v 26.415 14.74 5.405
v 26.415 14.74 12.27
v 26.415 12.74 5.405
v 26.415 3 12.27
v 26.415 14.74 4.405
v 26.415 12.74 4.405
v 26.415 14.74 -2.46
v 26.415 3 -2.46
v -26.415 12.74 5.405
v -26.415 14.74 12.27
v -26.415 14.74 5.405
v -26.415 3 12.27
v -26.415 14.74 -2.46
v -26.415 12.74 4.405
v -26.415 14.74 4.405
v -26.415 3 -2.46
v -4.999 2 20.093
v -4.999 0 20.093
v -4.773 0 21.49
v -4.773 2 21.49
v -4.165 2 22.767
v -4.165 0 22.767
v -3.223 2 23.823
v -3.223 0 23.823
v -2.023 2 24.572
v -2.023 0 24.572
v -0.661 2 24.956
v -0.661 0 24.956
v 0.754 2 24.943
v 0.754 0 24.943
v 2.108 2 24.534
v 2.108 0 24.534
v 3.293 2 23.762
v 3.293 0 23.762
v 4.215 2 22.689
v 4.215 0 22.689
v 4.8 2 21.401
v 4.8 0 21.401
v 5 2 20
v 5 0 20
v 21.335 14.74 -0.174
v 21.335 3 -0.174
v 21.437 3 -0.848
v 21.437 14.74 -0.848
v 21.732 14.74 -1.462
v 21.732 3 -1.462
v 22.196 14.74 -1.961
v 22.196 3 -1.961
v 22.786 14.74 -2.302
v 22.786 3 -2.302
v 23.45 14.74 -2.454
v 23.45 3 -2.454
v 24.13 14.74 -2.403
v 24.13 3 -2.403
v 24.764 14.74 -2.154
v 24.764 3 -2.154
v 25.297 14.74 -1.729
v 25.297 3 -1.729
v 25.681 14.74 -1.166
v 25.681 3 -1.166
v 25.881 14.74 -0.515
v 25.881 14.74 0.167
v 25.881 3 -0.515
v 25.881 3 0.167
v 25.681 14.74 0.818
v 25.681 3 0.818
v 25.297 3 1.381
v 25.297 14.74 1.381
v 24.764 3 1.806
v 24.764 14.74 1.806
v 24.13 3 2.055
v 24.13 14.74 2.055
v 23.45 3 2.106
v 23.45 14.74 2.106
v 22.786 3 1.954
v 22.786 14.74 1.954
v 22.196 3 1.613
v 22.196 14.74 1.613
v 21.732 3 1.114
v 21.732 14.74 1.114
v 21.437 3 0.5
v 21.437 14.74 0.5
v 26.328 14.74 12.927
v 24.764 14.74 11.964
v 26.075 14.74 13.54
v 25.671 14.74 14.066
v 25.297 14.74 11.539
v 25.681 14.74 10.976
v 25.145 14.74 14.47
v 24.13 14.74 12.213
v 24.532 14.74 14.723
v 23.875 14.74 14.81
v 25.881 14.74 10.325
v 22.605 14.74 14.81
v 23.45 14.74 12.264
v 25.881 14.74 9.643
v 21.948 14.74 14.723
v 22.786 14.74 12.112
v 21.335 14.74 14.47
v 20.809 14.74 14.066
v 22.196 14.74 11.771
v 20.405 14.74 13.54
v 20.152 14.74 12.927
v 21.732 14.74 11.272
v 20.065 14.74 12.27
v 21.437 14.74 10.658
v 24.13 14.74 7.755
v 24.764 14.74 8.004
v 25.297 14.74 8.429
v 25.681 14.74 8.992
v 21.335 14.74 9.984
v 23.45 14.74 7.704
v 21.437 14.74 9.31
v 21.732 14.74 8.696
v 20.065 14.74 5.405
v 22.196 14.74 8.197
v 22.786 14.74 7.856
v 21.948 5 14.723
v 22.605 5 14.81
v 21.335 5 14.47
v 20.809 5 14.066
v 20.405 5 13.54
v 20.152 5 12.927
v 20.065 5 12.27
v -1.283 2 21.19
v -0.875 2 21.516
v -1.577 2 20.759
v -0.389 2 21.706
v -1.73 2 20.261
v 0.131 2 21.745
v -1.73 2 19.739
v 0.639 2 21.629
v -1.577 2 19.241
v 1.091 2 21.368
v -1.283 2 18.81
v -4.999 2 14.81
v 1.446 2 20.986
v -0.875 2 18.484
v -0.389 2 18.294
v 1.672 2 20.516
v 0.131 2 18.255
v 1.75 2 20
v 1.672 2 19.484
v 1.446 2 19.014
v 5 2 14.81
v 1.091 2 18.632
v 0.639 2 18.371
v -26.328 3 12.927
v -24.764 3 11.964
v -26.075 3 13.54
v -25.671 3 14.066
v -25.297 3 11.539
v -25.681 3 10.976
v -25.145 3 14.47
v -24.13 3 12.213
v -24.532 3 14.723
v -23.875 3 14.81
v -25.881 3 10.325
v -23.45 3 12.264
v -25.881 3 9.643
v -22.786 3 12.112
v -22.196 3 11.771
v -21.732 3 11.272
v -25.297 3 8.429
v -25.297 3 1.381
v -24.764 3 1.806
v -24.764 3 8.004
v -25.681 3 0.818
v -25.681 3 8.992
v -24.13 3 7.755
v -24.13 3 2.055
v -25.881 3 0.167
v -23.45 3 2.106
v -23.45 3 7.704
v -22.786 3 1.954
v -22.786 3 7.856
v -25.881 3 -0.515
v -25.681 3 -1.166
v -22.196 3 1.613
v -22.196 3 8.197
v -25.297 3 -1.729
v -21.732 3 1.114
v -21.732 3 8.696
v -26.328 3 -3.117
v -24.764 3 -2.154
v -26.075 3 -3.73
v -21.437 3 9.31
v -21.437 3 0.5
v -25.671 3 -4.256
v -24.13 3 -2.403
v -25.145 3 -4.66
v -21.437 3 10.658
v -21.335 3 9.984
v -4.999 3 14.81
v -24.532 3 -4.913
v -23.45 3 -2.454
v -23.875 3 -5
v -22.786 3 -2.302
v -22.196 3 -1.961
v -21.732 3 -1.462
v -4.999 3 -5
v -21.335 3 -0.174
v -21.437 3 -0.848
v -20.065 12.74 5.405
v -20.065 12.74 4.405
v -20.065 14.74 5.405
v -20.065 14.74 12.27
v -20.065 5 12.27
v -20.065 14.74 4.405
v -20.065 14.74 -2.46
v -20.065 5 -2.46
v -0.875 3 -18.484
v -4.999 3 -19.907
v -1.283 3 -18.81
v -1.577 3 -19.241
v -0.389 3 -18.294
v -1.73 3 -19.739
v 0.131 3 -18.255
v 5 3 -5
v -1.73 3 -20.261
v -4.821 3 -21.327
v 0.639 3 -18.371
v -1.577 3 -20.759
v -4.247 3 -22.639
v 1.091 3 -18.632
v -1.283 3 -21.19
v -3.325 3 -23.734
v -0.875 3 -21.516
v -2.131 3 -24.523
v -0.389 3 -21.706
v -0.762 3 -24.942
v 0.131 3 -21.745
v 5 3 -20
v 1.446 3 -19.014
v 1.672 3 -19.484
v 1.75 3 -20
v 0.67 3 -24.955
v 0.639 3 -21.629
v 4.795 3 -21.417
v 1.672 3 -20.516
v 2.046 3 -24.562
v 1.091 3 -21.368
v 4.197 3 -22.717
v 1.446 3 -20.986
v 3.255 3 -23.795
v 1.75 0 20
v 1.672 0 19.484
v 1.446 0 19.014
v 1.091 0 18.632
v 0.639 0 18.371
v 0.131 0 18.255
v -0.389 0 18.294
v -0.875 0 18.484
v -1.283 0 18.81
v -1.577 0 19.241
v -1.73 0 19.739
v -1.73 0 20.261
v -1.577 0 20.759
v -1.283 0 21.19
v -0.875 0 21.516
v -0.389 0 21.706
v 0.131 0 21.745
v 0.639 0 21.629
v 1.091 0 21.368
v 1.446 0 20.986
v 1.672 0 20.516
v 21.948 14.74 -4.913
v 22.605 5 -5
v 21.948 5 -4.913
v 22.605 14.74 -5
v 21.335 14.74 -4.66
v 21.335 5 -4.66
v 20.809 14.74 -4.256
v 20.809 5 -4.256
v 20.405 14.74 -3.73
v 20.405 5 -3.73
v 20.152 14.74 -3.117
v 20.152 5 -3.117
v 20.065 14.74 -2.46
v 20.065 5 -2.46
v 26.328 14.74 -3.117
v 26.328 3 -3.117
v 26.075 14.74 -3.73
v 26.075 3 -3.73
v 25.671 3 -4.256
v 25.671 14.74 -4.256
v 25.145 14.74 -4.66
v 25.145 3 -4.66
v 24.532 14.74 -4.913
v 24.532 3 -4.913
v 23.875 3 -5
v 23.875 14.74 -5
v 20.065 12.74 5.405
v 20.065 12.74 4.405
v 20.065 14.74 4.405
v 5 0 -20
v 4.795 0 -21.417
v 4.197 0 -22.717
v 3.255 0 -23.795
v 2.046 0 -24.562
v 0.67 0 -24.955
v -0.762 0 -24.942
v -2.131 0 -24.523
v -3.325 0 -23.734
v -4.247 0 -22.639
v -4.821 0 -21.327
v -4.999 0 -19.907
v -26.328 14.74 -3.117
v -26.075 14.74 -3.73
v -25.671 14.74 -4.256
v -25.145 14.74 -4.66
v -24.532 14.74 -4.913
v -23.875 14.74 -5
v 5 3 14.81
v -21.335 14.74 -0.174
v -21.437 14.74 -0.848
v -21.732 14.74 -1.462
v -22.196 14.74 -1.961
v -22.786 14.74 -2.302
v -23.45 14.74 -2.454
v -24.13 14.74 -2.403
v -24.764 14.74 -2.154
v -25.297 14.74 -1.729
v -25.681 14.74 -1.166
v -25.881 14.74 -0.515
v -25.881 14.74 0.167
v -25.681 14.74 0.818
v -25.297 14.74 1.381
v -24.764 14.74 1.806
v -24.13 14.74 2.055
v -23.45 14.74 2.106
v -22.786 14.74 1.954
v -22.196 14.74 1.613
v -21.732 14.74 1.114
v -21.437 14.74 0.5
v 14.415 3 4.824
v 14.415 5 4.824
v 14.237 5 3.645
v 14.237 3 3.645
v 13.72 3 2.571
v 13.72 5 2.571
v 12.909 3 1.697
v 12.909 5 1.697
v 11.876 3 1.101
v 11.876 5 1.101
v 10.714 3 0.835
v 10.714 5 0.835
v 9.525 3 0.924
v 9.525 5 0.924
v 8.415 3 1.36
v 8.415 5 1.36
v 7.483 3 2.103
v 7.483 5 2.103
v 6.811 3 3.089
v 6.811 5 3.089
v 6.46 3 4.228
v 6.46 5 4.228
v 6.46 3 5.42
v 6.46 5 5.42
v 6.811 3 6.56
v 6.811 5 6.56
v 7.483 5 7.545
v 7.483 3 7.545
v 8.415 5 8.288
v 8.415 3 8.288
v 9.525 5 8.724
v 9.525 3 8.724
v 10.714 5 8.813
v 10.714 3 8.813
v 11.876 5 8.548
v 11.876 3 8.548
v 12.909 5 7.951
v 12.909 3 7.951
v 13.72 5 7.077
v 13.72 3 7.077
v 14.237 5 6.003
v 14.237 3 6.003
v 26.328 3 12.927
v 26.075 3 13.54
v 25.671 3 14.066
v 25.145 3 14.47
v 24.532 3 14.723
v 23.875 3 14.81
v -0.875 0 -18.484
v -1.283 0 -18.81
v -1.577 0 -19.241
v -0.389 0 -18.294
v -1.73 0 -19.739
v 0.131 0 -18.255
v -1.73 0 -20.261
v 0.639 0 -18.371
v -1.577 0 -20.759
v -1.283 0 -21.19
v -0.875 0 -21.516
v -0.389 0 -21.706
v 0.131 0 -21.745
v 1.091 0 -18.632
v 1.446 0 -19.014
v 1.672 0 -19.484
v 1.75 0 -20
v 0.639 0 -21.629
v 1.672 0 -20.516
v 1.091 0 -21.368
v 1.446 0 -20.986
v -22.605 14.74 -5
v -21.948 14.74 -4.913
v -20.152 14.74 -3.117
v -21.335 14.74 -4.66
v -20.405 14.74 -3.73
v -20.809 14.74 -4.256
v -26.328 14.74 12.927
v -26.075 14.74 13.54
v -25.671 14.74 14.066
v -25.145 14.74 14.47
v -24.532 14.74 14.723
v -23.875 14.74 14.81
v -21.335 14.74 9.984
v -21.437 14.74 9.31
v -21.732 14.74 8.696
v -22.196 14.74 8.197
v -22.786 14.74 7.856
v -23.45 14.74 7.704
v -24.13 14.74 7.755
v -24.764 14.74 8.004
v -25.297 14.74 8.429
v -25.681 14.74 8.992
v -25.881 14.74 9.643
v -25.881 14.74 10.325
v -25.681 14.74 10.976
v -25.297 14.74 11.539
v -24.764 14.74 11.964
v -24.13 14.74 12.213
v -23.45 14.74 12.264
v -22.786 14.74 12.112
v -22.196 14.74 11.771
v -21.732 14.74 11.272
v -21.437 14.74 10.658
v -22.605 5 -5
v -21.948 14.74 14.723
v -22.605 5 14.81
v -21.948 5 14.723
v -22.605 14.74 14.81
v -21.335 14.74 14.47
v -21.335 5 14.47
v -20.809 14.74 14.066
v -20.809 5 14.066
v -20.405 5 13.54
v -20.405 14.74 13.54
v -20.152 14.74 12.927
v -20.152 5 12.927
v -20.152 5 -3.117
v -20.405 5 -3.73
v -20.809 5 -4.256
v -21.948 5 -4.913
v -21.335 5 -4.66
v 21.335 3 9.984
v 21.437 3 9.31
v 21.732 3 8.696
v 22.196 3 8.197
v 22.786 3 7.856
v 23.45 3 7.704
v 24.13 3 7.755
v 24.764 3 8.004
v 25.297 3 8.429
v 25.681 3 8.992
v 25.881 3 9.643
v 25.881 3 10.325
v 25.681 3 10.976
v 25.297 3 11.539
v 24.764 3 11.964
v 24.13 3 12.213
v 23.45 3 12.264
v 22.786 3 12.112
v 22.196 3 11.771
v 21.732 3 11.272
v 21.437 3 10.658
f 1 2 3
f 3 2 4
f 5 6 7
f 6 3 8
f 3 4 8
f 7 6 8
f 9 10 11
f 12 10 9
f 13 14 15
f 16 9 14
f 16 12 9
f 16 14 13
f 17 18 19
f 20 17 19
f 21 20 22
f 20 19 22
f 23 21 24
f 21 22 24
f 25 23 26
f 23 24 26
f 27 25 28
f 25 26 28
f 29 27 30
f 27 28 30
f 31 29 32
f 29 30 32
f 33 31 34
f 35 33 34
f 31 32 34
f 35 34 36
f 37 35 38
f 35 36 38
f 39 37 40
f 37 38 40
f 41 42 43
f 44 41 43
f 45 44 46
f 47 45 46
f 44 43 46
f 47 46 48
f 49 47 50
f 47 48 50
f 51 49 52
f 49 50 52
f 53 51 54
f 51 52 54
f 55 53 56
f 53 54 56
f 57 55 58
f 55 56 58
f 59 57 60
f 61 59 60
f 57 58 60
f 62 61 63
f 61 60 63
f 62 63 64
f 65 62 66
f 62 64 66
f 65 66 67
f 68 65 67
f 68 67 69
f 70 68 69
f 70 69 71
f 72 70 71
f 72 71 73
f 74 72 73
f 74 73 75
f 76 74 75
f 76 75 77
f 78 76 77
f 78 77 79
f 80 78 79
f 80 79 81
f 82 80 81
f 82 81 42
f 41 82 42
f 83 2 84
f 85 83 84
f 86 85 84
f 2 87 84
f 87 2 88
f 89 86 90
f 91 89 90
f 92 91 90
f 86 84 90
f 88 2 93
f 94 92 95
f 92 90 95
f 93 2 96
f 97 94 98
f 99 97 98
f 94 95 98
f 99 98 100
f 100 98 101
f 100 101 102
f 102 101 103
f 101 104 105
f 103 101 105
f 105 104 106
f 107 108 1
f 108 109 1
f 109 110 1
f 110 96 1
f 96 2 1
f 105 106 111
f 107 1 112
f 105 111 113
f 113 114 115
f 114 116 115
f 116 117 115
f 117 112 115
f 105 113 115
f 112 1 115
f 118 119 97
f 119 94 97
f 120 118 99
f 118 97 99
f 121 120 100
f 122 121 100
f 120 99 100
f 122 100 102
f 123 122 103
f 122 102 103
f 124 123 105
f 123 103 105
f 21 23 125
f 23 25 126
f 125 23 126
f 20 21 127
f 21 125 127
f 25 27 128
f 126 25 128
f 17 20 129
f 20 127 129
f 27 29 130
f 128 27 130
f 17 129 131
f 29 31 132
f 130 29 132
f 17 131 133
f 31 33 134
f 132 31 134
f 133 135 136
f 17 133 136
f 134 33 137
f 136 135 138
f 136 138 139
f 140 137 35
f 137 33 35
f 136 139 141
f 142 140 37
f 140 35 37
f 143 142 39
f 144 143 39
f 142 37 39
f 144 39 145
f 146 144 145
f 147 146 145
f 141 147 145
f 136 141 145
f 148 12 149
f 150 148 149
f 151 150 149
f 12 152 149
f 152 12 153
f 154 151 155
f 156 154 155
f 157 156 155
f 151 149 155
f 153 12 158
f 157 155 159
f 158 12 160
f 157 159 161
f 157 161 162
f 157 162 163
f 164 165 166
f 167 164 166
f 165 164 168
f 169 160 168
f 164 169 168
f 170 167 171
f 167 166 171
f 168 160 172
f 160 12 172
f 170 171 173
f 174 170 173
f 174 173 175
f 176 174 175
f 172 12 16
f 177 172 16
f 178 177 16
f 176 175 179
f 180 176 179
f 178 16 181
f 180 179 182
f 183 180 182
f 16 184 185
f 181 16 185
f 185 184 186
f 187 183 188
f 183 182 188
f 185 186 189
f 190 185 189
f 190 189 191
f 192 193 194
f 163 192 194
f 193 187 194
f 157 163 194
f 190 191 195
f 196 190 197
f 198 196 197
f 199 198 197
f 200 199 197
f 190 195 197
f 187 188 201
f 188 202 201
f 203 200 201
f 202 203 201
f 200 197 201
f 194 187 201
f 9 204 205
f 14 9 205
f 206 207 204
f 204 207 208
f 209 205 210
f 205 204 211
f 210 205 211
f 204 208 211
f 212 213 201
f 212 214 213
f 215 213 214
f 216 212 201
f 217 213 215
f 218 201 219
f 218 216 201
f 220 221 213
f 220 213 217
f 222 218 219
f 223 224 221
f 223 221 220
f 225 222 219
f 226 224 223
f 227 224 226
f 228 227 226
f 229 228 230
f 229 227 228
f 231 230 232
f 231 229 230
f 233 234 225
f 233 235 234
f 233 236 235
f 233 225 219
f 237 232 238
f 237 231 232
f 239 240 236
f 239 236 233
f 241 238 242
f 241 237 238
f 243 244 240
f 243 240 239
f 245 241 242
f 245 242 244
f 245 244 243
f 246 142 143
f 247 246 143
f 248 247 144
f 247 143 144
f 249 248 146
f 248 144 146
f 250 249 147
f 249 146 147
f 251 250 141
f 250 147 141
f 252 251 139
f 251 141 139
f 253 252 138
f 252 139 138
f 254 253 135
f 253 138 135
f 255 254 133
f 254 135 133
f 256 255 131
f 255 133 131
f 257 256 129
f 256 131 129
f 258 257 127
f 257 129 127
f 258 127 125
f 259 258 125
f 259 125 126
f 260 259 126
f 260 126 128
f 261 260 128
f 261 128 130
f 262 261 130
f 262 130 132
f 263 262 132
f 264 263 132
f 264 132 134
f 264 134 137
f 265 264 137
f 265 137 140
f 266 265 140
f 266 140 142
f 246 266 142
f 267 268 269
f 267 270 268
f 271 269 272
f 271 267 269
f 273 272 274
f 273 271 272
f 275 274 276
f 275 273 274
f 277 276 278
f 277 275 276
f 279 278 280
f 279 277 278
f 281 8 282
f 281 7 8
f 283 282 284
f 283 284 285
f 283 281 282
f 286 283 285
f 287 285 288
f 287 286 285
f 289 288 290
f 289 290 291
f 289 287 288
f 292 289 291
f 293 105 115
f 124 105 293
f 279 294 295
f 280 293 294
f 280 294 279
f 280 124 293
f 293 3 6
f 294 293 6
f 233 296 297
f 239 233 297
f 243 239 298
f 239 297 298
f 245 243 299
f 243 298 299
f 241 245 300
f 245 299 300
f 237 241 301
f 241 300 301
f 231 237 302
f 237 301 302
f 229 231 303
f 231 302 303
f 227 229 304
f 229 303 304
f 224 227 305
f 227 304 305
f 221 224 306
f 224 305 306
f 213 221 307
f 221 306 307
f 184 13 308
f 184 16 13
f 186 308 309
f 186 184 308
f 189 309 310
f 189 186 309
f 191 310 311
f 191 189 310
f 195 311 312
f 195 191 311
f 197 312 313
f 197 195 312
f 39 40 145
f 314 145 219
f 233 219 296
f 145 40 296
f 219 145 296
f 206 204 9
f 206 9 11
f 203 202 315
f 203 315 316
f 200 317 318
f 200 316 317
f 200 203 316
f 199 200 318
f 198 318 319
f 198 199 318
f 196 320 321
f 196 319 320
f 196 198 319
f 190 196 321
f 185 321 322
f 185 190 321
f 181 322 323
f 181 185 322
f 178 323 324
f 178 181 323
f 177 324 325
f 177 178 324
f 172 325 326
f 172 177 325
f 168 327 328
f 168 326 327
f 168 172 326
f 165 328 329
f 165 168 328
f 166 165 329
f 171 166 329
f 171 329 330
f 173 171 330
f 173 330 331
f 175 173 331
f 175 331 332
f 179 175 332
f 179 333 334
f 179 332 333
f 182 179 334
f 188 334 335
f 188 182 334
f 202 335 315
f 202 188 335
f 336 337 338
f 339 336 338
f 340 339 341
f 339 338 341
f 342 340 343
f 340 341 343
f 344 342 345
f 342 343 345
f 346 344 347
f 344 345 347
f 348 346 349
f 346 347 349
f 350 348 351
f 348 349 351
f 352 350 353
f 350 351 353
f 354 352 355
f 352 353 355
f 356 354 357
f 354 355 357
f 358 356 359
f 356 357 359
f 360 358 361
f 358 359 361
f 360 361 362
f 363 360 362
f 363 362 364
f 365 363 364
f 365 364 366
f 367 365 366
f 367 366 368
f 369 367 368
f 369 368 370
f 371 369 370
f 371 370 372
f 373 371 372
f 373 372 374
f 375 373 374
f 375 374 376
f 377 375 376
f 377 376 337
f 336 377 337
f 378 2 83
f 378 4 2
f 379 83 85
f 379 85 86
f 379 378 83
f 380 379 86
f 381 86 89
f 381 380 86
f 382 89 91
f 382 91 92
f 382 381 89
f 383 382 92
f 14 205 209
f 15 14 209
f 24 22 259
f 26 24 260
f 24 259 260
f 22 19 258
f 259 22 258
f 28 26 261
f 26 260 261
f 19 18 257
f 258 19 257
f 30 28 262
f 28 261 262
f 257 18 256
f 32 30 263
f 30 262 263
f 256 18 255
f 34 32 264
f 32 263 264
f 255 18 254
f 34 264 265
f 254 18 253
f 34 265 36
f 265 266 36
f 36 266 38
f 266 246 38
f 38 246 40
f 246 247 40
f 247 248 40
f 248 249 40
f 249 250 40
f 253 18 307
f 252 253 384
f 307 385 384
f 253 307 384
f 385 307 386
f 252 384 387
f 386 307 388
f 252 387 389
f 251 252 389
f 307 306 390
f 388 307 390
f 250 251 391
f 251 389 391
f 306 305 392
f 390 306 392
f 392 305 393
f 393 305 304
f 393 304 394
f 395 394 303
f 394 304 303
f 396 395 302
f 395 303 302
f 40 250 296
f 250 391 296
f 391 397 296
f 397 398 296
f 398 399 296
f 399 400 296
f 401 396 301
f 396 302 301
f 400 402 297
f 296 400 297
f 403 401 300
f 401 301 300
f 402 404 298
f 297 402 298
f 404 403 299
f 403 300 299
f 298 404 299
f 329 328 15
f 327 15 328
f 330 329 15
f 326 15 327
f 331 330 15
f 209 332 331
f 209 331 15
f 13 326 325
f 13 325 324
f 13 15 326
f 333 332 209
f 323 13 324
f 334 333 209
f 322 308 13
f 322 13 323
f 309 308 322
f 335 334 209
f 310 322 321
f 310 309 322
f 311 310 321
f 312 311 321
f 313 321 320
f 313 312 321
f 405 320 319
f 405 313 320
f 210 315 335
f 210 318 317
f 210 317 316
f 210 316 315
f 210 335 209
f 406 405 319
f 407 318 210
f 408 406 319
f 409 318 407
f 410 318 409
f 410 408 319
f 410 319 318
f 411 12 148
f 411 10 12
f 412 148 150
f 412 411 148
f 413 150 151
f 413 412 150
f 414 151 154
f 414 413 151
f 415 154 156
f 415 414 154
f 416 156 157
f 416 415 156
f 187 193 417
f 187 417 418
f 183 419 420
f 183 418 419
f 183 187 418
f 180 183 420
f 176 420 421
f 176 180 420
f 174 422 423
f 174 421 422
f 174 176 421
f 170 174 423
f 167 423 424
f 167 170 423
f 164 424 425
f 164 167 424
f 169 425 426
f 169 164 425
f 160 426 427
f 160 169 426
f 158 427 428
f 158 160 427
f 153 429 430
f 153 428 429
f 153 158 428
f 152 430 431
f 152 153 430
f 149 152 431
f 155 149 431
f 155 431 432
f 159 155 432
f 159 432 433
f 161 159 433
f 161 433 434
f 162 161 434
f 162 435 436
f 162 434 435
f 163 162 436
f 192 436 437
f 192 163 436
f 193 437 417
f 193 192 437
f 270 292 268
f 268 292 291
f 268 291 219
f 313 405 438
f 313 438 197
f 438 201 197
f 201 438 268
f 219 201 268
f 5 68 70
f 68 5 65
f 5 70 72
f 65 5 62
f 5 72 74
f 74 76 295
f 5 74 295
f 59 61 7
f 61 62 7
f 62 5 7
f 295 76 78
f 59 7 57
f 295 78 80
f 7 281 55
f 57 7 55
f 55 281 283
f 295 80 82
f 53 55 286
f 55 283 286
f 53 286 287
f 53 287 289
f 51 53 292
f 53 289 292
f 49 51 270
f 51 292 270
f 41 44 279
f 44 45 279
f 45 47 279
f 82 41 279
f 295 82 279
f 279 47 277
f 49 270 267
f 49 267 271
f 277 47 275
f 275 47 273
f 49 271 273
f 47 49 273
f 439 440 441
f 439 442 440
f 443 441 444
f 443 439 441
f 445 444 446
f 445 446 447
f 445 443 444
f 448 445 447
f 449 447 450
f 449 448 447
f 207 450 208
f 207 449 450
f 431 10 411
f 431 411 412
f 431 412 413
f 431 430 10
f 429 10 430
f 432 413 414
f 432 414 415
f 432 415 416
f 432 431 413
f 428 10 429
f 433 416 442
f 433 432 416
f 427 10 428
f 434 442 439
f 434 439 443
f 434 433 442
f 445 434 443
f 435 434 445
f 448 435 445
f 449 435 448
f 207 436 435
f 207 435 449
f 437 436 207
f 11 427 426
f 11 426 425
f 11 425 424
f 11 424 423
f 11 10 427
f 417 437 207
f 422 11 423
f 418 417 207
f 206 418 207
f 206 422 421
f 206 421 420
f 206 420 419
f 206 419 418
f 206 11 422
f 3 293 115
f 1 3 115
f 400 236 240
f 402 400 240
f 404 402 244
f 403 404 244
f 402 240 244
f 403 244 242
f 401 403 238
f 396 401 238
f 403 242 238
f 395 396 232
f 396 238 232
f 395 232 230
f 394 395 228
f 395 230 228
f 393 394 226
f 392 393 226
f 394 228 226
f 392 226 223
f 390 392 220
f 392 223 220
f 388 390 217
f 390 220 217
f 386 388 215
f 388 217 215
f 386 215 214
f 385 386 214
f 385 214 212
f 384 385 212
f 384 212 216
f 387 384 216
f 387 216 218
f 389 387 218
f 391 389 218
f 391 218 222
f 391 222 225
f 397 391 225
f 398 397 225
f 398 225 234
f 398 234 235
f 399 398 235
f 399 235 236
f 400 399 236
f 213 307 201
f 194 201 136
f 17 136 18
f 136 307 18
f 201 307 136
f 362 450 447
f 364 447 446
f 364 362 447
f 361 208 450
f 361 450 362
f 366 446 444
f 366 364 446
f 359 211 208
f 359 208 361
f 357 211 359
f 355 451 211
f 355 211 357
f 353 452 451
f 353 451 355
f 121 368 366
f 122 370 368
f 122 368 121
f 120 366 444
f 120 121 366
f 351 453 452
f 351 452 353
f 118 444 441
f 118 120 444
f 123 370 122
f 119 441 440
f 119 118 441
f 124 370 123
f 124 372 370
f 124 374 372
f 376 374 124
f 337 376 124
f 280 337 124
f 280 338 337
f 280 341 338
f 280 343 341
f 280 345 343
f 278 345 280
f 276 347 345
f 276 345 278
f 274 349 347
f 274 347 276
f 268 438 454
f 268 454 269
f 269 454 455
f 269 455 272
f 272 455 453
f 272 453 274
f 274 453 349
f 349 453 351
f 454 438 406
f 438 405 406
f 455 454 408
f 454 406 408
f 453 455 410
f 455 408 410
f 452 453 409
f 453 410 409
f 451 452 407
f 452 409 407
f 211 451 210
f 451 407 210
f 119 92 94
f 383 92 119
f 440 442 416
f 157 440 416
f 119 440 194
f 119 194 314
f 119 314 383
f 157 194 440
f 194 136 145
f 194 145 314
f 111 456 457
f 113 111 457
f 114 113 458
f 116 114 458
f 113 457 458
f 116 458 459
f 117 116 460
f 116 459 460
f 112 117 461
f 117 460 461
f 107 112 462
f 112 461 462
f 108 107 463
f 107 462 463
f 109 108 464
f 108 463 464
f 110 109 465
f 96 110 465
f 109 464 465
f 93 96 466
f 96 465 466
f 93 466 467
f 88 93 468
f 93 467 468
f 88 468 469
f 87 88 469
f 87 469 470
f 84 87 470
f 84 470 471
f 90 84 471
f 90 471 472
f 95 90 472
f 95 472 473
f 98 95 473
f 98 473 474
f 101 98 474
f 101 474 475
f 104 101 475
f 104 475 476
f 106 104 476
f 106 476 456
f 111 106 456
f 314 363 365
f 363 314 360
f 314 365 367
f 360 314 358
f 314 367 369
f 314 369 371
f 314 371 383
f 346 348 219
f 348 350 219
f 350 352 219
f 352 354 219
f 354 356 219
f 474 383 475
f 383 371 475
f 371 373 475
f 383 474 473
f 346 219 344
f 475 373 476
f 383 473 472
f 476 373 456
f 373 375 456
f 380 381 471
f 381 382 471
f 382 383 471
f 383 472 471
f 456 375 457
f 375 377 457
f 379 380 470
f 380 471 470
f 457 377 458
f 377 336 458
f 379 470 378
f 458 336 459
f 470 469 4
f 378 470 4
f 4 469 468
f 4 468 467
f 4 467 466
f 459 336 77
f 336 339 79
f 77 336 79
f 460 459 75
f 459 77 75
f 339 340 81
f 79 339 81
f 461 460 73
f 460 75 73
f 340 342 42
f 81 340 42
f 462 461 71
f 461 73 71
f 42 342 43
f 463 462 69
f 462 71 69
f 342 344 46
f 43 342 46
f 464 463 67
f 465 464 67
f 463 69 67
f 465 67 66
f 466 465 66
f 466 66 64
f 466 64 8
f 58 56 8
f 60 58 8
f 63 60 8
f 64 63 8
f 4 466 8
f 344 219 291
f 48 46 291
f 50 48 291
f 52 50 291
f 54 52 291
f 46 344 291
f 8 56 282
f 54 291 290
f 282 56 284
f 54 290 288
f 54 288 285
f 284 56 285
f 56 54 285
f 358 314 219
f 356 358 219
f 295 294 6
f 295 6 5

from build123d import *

# Parameters (mm, degrees)
BOSS_EXTRU_1_DEPTH      = 3
ENL_V_MAT_EXTRU_1_REACH = 5
ESQUISSE3_R             = 1.75
ESQUISSE4_W             = 52.83
ESQUISSE4_H             = 19.81
BOSS_EXTRU_2_DEPTH      = 2
ESQUISSE6_W             = 6.35
ESQUISSE6_H             = 19.81
BOSS_EXTRU_3_DEPTH      = 9.74
ENL_V_START             = -6
ESQUISSE5_R             = 2.286
ENL_V_MAT_EXTRU_2_DEPTH = 16.74
ESQUISSE7_R             = 4
ENL_V_MAT_EXTRU_3_DEPTH = 6
ESQUISSE8_W             = 1
ESQUISSE8_H             = 2
ENL_V_MAT_EXTRU_4_DEPTH = 53.83
ESQUISSE9_W             = 10.19
ESQUISSE9_H             = 1
ENL_V_MAT_EXTRU_5_DEPTH = 32.415
CONG_1_R                = 2.54
CONG_2_R                = 2.54


with BuildPart() as part:
    # Esquisse2 → Boss.-Extru.1 (new body)
    with BuildSketch(Plane(origin=(0, 0, 0), x_dir=(1, 0, 0), z_dir=(0, 1, 0))):
        with BuildLine():
            Line((-4.999130413, 19.906752432), (-4.999130413, -20.093247568))
            ThreePointArc((-4.999130413, -20.093247568), (0.046625811, -24.999782599), (5, -20))
            Line((5, -20), (5, 20))
            ThreePointArc((5, 20), (-0.046625811, 24.999782599), (-4.999130413, 19.906752432))
        make_face()
    extrude(amount=BOSS_EXTRU_1_DEPTH)

    # Esquisse3 → Enlèv. mat.-Extru.1 (cut, up to next)
    with BuildSketch(Plane(origin=(0, 3, 0), x_dir=(1, 0, 0), z_dir=(0, 1, 0)), mode=Mode.PRIVATE) as enl_v_mat_extru_1_sk1:
        with Locations((0, 20)):
            Circle(ESQUISSE3_R)
    enl_v_mat_extru_1_tool1 = extrude(enl_v_mat_extru_1_sk1.sketch, amount=-ENL_V_MAT_EXTRU_1_REACH, mode=Mode.PRIVATE) & part.part
    add(enl_v_mat_extru_1_tool1.solids().sort_by_distance((0, 3, -20))[0], mode=Mode.SUBTRACT)
    # Esquisse3 → Enlèv. mat.-Extru.1 (cut, up to next)
    with BuildSketch(Plane(origin=(0, 3, 0), x_dir=(1, 0, 0), z_dir=(0, 1, 0)), mode=Mode.PRIVATE) as enl_v_mat_extru_1_sk2:
        with Locations((0, -20)):
            Circle(ESQUISSE3_R)
    enl_v_mat_extru_1_tool2 = extrude(enl_v_mat_extru_1_sk2.sketch, amount=-ENL_V_MAT_EXTRU_1_REACH, mode=Mode.PRIVATE) & part.part
    add(enl_v_mat_extru_1_tool2.solids().sort_by_distance((0, 3, 20))[0], mode=Mode.SUBTRACT)

    # Esquisse4 → Boss.-Extru.2 (add)
    with BuildSketch(Plane(origin=(0, 3, 0), x_dir=(1, 0, 0), z_dir=(0, 1, 0))):
        with Locations((0, -4.905)):
            Rectangle(ESQUISSE4_W, ESQUISSE4_H)
    extrude(amount=BOSS_EXTRU_2_DEPTH)

    # Esquisse6 → Boss.-Extru.3 (add)
    with BuildSketch(Plane(origin=(0, 5, 0), x_dir=(1, 0, 0), z_dir=(0, 1, 0))):
        with Locations((-23.24, -4.905)):
            Rectangle(ESQUISSE6_W, ESQUISSE6_H)
    boss_extru_3 = extrude(amount=BOSS_EXTRU_3_DEPTH)

    # Esquisse5 → Enlèv. mat.-Extru.2 (cut)
    with BuildSketch(Plane(origin=(0, 5, 0), x_dir=(1, 0, 0), z_dir=(0, 1, 0)).offset(ENL_V_START)):
        with Locations((-23.621, 0.174)):
            Circle(ESQUISSE5_R)
        with Locations((-23.621, -9.984)):
            Circle(ESQUISSE5_R)
    enl_v_mat_extru_2 = extrude(amount=ENL_V_MAT_EXTRU_2_DEPTH, mode=Mode.SUBTRACT)

    # Symétrie1: Boss.-Extru.3, Enlèv. mat.-Extru.2 across plane
    add(boss_extru_3.mirror(Plane(origin=(0, 0, 0), x_dir=(0, 0, 1), z_dir=(1, 0, 0))))
    add(enl_v_mat_extru_2.mirror(Plane(origin=(0, 0, 0), x_dir=(0, 0, 1), z_dir=(1, 0, 0))), mode=Mode.SUBTRACT)

    # Esquisse7 → Enlèv. mat.-Extru.3 (cut, through all)
    with BuildSketch(Plane(origin=(0, 5, 0), x_dir=(1, 0, 0), z_dir=(0, 1, 0))):
        with Locations((10.415, -4.824151883)):
            Circle(ESQUISSE7_R)
    extrude(amount=-ENL_V_MAT_EXTRU_3_DEPTH, mode=Mode.SUBTRACT)

    # Esquisse8 → Enlèv. mat.-Extru.4 (cut, through all)
    with BuildSketch(Plane(origin=(26.415, 0, 0), x_dir=(0, 0, -1), z_dir=(1, 0, 0))):
        with Locations((-4.905, 13.74)):
            Rectangle(ESQUISSE8_W, ESQUISSE8_H)
    extrude(amount=-ENL_V_MAT_EXTRU_4_DEPTH, mode=Mode.SUBTRACT)

    # Esquisse9 → Enlèv. mat.-Extru.5 (cut, through all)
    with BuildSketch(Plane(origin=(5, 0, 0), x_dir=(0, 0, -1), z_dir=(1, 0, 0))):
        with Locations((-19.905, 2.5)):
            Rectangle(ESQUISSE9_W, ESQUISSE9_H)
    extrude(amount=-ENL_V_MAT_EXTRU_5_DEPTH, mode=Mode.SUBTRACT)

    # Congé1
    cong_1_edges = [part.edges().sort_by_distance(p)[0] for p in [
        (-26.415, 8.87, -5),
        (-26.415, 8.87, 14.81),
        (26.415, 8.87, 14.81),
        (26.415, 8.87, -5),
    ]]
    fillet(cong_1_edges, radius=CONG_1_R)

    # Congé2
    cong_2_edges = [part.edges().sort_by_distance(p)[0] for p in [
        (-20.065, 9.87, 14.81),
        (-20.065, 9.87, -5),
        (20.065, 9.87, -5),
        (20.065, 9.87, 14.81),
    ]]
    fillet(cong_2_edges, radius=CONG_2_R)


solid = part.part
